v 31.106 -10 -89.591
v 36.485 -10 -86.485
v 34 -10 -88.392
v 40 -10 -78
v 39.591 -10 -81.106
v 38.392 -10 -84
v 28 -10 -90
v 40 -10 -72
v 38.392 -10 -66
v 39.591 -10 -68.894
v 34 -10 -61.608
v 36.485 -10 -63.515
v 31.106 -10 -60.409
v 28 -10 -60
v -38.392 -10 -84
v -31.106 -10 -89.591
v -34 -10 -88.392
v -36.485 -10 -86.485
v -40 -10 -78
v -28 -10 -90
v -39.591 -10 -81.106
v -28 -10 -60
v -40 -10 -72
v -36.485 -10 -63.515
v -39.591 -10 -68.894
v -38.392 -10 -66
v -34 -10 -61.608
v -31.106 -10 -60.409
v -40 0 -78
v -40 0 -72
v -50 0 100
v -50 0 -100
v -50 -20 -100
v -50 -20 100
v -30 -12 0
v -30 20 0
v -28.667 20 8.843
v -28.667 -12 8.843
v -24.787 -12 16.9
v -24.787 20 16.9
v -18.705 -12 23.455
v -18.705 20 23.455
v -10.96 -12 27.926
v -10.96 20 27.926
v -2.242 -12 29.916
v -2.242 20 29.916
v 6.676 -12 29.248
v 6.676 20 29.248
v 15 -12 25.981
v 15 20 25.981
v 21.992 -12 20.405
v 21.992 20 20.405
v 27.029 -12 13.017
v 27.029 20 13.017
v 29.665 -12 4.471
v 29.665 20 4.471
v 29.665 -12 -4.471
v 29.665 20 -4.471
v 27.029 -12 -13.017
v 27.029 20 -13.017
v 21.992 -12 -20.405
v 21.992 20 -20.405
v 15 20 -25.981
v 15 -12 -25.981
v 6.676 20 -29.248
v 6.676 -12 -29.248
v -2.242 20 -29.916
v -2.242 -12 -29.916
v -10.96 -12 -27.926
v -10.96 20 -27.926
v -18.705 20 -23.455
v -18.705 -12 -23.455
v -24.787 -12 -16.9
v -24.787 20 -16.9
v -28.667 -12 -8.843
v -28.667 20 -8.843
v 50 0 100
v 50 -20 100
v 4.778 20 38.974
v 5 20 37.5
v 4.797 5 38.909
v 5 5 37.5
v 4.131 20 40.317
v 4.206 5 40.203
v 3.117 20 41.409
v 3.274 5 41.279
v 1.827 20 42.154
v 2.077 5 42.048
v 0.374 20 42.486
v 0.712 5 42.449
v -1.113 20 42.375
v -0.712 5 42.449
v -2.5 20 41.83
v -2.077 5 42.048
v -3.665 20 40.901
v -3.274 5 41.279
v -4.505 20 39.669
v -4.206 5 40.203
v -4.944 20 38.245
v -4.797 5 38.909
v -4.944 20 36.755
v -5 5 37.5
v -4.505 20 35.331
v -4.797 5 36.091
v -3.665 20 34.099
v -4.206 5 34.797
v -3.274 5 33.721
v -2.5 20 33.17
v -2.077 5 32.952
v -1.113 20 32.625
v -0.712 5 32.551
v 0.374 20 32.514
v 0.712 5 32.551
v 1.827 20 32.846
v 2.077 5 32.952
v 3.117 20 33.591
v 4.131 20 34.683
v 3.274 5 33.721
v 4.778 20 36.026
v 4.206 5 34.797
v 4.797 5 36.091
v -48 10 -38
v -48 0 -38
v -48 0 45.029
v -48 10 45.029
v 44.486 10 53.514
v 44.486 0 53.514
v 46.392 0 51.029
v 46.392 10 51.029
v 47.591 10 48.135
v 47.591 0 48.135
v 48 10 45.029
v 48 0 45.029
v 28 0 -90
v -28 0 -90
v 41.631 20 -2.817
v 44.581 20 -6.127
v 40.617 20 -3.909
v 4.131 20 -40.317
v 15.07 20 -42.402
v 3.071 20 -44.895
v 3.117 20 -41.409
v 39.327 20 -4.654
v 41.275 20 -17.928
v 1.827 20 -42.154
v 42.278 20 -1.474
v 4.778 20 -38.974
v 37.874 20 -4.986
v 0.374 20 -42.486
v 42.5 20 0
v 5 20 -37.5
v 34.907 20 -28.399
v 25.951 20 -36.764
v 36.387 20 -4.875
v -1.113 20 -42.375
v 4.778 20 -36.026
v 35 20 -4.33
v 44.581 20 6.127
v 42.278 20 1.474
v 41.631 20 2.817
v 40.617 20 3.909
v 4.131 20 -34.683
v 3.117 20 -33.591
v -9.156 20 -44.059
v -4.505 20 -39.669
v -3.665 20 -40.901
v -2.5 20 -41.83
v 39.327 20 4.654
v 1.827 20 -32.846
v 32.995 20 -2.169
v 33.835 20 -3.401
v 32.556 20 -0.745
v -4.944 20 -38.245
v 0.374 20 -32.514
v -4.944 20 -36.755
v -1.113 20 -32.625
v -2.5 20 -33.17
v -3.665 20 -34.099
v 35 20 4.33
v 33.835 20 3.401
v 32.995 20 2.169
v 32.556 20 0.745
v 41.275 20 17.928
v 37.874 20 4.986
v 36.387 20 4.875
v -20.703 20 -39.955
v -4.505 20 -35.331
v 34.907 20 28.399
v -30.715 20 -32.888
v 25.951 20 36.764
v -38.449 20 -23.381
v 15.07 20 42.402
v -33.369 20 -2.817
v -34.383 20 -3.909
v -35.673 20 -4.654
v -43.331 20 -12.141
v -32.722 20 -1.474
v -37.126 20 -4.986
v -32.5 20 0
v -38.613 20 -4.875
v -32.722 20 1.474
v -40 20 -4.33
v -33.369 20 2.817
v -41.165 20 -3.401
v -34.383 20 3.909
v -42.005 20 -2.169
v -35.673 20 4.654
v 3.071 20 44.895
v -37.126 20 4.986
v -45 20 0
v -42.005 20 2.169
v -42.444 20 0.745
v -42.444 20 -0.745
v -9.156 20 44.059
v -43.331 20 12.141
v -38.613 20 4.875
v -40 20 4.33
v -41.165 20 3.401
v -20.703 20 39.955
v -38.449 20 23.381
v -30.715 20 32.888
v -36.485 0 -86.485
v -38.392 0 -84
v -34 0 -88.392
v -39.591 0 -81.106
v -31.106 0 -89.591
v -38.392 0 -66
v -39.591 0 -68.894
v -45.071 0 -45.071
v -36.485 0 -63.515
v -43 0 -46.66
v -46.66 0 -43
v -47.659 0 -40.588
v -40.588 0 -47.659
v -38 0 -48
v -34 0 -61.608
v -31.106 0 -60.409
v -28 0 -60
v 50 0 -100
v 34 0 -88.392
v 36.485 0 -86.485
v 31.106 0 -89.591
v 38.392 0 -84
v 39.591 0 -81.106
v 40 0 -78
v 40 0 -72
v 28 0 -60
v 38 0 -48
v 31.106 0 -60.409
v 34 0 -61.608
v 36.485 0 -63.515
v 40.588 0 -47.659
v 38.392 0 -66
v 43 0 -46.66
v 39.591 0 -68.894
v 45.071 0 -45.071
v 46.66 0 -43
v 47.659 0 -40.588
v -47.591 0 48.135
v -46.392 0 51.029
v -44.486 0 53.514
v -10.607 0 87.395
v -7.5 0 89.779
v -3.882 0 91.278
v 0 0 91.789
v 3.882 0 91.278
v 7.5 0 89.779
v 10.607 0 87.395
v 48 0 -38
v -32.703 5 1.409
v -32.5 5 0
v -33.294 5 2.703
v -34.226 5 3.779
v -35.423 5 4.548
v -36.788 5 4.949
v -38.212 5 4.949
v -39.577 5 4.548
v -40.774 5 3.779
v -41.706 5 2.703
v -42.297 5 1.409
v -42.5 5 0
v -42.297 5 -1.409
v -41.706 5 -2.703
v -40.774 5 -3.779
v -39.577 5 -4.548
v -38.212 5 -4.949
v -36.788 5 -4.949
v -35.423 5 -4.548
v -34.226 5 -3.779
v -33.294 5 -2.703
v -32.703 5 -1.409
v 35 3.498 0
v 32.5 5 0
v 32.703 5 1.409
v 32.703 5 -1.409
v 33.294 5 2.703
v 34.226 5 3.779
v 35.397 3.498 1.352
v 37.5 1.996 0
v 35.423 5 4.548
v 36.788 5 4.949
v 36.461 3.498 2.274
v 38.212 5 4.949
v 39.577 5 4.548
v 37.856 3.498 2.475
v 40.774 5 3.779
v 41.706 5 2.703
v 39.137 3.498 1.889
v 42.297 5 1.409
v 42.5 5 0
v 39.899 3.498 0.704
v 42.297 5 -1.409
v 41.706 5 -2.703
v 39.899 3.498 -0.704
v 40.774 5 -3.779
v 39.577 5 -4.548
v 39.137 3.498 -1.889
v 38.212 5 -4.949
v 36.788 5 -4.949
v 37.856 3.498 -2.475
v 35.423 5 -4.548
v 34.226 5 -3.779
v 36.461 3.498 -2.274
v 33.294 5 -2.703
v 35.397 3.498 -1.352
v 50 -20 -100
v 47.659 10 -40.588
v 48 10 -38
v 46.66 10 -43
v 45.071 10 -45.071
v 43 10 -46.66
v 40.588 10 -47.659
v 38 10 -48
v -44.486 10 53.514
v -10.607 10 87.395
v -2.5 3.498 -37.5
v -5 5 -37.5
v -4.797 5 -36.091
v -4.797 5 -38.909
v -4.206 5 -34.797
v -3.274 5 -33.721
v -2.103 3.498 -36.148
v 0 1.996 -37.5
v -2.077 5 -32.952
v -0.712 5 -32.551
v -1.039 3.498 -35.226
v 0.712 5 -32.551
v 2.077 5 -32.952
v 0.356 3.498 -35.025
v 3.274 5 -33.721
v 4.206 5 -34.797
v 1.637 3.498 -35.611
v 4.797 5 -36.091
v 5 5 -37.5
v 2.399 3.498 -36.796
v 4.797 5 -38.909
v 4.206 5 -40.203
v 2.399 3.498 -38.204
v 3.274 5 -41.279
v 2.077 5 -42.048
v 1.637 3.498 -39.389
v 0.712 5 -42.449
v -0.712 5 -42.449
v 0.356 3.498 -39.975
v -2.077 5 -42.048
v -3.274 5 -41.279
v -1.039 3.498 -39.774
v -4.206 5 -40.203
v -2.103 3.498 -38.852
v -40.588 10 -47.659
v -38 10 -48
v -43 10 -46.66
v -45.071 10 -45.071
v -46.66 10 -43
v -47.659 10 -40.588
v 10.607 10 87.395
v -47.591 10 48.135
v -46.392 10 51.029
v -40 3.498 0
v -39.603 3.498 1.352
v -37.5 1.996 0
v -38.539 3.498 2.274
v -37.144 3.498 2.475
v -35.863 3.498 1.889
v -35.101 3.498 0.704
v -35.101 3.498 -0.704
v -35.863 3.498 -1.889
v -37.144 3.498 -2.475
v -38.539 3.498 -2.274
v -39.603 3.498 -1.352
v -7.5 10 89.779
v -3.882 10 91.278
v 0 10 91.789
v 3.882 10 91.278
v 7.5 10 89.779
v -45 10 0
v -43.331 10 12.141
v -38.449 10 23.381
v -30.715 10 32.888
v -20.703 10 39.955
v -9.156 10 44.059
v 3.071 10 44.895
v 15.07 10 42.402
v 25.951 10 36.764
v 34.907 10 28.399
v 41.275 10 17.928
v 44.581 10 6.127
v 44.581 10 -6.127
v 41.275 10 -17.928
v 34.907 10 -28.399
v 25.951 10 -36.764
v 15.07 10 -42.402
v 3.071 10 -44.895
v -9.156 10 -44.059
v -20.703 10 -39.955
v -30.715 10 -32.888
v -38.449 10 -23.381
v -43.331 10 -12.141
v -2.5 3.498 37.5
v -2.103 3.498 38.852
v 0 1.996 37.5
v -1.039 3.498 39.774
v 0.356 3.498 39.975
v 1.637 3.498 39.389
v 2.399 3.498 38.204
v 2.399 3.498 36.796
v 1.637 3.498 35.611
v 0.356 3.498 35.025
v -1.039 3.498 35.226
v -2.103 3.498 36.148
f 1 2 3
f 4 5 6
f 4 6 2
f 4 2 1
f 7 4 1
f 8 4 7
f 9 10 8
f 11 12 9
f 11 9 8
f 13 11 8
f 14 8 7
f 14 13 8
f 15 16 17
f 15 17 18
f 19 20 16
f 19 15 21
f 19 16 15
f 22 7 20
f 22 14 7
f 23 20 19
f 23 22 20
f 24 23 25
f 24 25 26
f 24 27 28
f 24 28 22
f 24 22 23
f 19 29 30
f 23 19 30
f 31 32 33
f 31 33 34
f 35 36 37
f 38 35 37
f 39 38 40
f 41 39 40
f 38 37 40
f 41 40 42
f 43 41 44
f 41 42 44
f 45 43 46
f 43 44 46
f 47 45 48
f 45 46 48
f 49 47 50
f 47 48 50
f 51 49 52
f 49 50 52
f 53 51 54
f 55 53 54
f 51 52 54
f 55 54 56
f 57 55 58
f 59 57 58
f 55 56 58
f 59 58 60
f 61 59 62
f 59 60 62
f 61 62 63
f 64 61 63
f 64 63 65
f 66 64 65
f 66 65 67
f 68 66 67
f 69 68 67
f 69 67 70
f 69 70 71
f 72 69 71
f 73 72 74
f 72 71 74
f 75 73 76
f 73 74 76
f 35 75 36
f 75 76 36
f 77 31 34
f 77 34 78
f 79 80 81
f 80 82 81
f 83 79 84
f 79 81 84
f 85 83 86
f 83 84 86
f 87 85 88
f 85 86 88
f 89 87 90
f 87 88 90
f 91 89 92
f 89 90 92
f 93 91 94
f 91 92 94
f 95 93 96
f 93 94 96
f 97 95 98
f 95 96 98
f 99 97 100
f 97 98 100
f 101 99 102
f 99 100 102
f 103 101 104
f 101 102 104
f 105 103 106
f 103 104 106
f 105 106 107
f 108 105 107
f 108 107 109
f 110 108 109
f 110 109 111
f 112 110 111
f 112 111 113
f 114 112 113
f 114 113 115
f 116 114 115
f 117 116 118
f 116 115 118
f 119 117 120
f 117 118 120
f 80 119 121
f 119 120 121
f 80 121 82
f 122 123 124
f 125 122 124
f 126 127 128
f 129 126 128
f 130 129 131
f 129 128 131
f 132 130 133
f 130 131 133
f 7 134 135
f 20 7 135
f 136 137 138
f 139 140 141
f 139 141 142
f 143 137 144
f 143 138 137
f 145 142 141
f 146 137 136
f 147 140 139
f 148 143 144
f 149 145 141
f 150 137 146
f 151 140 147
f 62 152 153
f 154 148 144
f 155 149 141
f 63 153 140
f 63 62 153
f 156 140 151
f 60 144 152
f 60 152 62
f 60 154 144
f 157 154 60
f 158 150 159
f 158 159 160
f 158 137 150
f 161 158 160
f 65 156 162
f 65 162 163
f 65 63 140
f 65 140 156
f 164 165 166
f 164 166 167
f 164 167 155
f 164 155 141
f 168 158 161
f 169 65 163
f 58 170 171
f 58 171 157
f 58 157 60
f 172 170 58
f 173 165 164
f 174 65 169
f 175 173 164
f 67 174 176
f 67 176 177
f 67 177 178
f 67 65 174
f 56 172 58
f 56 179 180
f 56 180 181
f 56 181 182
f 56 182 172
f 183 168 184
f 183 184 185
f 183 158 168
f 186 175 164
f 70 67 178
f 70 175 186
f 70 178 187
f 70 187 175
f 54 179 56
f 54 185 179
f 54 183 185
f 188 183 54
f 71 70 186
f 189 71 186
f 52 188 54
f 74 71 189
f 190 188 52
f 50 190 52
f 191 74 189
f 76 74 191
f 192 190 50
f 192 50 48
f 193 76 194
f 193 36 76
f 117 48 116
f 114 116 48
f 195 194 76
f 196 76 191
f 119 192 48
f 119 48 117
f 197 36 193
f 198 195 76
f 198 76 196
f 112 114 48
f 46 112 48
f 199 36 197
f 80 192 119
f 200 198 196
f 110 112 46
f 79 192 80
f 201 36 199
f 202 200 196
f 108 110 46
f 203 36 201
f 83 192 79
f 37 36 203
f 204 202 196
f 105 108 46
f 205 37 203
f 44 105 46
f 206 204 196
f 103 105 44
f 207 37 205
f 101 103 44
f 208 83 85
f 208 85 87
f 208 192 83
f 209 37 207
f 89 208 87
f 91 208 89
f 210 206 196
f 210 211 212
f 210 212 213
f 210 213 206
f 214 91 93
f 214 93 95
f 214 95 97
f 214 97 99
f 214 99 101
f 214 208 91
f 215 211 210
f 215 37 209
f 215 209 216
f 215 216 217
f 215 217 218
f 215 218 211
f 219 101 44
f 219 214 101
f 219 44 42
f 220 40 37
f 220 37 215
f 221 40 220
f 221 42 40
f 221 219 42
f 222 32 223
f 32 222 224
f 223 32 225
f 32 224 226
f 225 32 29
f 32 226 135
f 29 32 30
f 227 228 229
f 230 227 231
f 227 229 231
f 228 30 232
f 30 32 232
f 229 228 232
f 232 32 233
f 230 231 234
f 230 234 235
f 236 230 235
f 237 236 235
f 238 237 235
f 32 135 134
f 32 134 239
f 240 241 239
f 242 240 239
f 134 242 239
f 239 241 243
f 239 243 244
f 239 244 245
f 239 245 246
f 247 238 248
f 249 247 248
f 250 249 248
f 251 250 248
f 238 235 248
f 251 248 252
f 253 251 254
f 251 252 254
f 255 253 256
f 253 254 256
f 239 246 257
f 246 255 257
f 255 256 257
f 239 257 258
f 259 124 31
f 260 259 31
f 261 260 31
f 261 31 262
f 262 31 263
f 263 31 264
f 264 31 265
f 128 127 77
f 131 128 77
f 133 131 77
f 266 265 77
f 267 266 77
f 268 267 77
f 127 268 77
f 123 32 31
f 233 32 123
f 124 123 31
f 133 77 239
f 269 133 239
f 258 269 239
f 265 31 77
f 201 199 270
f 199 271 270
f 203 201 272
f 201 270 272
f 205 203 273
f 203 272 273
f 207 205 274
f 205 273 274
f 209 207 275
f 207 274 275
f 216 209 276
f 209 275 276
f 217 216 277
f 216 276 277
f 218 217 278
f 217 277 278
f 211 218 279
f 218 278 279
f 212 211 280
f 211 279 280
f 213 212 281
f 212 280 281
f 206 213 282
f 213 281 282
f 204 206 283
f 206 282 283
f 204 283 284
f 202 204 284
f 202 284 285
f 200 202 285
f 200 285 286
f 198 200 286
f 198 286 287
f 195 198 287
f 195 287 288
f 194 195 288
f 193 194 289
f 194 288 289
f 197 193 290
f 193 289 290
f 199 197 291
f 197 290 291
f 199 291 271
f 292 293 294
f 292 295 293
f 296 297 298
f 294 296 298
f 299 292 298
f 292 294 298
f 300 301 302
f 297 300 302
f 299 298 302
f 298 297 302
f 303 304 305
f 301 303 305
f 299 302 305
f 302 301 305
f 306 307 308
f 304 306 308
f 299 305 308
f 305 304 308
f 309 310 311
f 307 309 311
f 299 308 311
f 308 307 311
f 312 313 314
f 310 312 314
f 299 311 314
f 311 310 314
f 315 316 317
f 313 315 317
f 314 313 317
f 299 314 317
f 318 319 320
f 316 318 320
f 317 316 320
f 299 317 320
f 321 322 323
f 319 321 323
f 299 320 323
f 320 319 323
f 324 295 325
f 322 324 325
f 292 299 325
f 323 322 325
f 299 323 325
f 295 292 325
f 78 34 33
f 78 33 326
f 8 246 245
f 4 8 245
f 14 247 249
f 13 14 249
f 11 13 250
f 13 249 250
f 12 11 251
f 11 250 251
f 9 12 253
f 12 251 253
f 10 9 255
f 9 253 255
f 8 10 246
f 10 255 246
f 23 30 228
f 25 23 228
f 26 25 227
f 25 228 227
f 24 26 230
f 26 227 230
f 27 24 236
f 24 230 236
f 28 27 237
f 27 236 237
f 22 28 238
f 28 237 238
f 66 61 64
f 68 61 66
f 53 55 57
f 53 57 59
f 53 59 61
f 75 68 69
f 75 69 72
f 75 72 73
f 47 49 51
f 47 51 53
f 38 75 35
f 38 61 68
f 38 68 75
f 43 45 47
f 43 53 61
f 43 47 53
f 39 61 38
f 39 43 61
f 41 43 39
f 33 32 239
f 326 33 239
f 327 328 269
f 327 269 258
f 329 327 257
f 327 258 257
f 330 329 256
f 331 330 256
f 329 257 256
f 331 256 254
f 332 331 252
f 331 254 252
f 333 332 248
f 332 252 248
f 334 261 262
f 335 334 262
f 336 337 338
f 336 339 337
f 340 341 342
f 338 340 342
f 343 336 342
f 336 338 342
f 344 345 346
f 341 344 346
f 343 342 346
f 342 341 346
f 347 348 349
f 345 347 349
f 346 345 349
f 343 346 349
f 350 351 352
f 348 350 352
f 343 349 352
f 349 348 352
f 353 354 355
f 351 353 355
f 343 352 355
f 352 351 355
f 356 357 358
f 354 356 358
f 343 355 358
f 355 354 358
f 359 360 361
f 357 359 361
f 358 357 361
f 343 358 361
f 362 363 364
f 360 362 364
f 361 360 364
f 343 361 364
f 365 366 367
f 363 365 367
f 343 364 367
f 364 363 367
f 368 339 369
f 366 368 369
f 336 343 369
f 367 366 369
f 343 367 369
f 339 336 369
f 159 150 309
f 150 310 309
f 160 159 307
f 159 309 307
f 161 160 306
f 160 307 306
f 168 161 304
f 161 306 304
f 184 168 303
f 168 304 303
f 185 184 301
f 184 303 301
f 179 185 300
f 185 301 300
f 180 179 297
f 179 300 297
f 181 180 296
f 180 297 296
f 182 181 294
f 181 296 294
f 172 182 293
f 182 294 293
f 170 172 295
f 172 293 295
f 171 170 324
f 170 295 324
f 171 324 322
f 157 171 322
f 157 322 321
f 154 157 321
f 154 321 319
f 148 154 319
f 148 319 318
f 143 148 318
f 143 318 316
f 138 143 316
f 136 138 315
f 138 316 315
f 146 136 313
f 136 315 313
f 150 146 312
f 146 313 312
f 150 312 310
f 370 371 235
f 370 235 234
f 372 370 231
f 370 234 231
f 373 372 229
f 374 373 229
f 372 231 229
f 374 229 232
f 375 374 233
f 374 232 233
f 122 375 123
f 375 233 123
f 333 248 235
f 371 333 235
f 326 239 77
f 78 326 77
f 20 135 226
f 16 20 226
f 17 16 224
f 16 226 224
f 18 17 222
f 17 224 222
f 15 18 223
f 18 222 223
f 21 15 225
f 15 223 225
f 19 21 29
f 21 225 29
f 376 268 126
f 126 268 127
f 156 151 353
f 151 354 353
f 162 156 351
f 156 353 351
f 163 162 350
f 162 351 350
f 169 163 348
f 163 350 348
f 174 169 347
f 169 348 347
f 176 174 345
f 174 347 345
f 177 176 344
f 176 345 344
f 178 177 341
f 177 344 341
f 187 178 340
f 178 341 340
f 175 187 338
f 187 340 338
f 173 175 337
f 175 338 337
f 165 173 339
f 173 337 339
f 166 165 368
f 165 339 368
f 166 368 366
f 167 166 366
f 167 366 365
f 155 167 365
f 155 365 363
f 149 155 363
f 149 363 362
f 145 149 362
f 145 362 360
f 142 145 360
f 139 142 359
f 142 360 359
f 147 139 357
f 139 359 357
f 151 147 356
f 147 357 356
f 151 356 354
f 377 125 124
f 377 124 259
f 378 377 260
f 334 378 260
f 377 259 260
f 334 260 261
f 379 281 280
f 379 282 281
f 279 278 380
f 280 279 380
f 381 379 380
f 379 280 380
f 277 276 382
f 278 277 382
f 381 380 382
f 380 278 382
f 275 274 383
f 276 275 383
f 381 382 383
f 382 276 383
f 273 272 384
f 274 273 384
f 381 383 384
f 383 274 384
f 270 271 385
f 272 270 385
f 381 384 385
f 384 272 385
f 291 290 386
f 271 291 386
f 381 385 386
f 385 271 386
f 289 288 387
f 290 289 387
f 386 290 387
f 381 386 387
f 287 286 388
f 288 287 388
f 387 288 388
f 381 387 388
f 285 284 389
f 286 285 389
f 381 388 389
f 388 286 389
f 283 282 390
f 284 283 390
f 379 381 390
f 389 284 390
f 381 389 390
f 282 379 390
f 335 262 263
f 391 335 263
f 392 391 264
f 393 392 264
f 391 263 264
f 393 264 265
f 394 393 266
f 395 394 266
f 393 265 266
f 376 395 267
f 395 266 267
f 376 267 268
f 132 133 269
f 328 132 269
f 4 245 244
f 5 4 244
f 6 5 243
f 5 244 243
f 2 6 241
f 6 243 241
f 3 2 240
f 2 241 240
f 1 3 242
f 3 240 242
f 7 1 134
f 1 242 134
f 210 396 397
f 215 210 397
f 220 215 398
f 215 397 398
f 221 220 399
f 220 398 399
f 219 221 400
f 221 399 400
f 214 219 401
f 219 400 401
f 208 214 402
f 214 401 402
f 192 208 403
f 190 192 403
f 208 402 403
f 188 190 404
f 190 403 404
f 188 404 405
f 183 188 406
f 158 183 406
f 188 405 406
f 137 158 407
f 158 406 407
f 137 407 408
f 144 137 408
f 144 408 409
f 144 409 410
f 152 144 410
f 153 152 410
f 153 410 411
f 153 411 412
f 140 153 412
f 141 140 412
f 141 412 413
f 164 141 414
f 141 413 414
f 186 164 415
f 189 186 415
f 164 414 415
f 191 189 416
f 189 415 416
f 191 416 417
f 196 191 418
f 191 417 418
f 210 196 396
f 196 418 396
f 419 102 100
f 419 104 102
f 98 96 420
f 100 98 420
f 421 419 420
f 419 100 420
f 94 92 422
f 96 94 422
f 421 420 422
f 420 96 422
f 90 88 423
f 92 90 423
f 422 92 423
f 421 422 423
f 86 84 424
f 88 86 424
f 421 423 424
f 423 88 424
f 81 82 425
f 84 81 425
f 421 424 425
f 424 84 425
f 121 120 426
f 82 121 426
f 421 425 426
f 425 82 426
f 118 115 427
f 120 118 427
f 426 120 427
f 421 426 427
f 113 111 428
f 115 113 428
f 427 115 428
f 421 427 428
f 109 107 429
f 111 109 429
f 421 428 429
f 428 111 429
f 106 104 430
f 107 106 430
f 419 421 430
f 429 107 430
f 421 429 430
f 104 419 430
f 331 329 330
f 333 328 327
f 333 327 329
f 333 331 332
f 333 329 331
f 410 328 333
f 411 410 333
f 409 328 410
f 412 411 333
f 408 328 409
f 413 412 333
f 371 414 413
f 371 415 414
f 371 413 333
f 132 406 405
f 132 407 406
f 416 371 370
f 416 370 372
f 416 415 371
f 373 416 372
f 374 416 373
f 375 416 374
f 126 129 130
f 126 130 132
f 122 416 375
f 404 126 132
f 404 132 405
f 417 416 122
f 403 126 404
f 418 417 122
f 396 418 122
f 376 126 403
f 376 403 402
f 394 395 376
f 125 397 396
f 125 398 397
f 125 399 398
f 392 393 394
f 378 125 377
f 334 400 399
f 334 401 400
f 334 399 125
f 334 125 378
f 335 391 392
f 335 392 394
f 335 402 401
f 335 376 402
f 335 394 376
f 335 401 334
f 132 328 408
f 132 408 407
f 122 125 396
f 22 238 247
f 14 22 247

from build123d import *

# Parameters (mm, degrees)
F0_W      = 100
F0_H      = 200
F1_DEPTH  = 20
F3_DEPTH  = 10
F5_DEPTH  = 10
F6_R      = 45
F6_R_2    = 30
F7_DEPTH  = 10
F8_R      = 30
F9_DEPTH  = 32
F11_D     = 10
F11_DEPTH = 15
F11_TIP   = 3.0043030951


with BuildPart() as f1:
    # F0 (on Front) → F1 (new body)
    with BuildSketch(Plane.XZ):
        Rectangle(F0_W, F0_H)
    extrude(amount=F1_DEPTH)

    # F2 (on face) → F3 (cut)
    with BuildSketch(Plane(origin=(0, 0, 0), x_dir=(-1, 0, 0), z_dir=(0, 1, 0))):
        with BuildLine():
            ThreePointArc((-28, -60), (-36.4852813742, -63.5147186258), (-40, -72))
            Line((-40, -72), (-40, -78))
            ThreePointArc((-40, -78), (-36.4852813742, -86.4852813742), (-28, -90))
            Line((-28, -90), (28, -90))
            ThreePointArc((28, -90), (36.4852813742, -86.4852813742), (40, -78))
            Line((40, -78), (40, -72))
            ThreePointArc((40, -72), (36.4852813742, -63.5147186258), (28, -60))
            Line((28, -60), (-28, -60))
        make_face()
    extrude(amount=-F3_DEPTH, mode=Mode.SUBTRACT)

    # F4 (on face) → F5 (join)
    with BuildSketch(Plane(origin=(0, 0, 0), x_dir=(-1, 0, 0), z_dir=(0, 1, 0))):
        with BuildLine():
            Line((-48, 45.029), (-48, -38))
            ThreePointArc((-48, -38), (-45.0710678119, -45.0710678119), (-38, -48))
            Line((-38, -48), (38, -48))
            ThreePointArc((38, -48), (45.0710678119, -45.0710678119), (48, -38))
            Line((48, -38), (48, 45.029))
            ThreePointArc((48, 45.029), (47.0866406093, 49.6209930314), (44.4856, 53.5139627365))
            Line((44.4856, 53.5139627365), (10.607, 87.3951071902))
            ThreePointArc((10.607, 87.3951071902), (0, 91.7889037696), (-10.607, 87.3951071902))
            Line((-10.607, 87.3951071902), (-44.4856, 53.5139627365))
            ThreePointArc((-44.4856, 53.5139627365), (-47.0866406093, 49.6209930314), (-48, 45.029))
        make_face()
    extrude(amount=F5_DEPTH)

    # F6 (on face) → F7 (join)
    with BuildSketch(Plane(origin=(0, 10, 0), x_dir=(-1, 0, 0), z_dir=(0, 1, 0))):
        Circle(F6_R)
        Circle(F6_R_2, mode=Mode.SUBTRACT)
        Circle(F6_R_2)
    extrude(amount=F7_DEPTH)

    # F8 (on face) → F9 (cut)
    with BuildSketch(Plane(origin=(0, 20, 0), x_dir=(-1, 0, 0), z_dir=(0, 1, 0))):
        Circle(F8_R)
    extrude(amount=-F9_DEPTH, mode=Mode.SUBTRACT)

    # F11
    with Locations(Plane(origin=(0, 20, 0), x_dir=(-1, 0, 0), z_dir=(0, 1, 0))):
        with Locations((-37.5, 0), (0, 37.5), (0, -37.5), (37.5, 0)):
            Hole(F11_D / 2, depth=F11_DEPTH)
            with Locations((0, 0, -(F11_DEPTH + F11_TIP / 2))):  # 118° drill point
                Cone(0, F11_D / 2, F11_TIP, mode=Mode.SUBTRACT)


solid = f1.part
